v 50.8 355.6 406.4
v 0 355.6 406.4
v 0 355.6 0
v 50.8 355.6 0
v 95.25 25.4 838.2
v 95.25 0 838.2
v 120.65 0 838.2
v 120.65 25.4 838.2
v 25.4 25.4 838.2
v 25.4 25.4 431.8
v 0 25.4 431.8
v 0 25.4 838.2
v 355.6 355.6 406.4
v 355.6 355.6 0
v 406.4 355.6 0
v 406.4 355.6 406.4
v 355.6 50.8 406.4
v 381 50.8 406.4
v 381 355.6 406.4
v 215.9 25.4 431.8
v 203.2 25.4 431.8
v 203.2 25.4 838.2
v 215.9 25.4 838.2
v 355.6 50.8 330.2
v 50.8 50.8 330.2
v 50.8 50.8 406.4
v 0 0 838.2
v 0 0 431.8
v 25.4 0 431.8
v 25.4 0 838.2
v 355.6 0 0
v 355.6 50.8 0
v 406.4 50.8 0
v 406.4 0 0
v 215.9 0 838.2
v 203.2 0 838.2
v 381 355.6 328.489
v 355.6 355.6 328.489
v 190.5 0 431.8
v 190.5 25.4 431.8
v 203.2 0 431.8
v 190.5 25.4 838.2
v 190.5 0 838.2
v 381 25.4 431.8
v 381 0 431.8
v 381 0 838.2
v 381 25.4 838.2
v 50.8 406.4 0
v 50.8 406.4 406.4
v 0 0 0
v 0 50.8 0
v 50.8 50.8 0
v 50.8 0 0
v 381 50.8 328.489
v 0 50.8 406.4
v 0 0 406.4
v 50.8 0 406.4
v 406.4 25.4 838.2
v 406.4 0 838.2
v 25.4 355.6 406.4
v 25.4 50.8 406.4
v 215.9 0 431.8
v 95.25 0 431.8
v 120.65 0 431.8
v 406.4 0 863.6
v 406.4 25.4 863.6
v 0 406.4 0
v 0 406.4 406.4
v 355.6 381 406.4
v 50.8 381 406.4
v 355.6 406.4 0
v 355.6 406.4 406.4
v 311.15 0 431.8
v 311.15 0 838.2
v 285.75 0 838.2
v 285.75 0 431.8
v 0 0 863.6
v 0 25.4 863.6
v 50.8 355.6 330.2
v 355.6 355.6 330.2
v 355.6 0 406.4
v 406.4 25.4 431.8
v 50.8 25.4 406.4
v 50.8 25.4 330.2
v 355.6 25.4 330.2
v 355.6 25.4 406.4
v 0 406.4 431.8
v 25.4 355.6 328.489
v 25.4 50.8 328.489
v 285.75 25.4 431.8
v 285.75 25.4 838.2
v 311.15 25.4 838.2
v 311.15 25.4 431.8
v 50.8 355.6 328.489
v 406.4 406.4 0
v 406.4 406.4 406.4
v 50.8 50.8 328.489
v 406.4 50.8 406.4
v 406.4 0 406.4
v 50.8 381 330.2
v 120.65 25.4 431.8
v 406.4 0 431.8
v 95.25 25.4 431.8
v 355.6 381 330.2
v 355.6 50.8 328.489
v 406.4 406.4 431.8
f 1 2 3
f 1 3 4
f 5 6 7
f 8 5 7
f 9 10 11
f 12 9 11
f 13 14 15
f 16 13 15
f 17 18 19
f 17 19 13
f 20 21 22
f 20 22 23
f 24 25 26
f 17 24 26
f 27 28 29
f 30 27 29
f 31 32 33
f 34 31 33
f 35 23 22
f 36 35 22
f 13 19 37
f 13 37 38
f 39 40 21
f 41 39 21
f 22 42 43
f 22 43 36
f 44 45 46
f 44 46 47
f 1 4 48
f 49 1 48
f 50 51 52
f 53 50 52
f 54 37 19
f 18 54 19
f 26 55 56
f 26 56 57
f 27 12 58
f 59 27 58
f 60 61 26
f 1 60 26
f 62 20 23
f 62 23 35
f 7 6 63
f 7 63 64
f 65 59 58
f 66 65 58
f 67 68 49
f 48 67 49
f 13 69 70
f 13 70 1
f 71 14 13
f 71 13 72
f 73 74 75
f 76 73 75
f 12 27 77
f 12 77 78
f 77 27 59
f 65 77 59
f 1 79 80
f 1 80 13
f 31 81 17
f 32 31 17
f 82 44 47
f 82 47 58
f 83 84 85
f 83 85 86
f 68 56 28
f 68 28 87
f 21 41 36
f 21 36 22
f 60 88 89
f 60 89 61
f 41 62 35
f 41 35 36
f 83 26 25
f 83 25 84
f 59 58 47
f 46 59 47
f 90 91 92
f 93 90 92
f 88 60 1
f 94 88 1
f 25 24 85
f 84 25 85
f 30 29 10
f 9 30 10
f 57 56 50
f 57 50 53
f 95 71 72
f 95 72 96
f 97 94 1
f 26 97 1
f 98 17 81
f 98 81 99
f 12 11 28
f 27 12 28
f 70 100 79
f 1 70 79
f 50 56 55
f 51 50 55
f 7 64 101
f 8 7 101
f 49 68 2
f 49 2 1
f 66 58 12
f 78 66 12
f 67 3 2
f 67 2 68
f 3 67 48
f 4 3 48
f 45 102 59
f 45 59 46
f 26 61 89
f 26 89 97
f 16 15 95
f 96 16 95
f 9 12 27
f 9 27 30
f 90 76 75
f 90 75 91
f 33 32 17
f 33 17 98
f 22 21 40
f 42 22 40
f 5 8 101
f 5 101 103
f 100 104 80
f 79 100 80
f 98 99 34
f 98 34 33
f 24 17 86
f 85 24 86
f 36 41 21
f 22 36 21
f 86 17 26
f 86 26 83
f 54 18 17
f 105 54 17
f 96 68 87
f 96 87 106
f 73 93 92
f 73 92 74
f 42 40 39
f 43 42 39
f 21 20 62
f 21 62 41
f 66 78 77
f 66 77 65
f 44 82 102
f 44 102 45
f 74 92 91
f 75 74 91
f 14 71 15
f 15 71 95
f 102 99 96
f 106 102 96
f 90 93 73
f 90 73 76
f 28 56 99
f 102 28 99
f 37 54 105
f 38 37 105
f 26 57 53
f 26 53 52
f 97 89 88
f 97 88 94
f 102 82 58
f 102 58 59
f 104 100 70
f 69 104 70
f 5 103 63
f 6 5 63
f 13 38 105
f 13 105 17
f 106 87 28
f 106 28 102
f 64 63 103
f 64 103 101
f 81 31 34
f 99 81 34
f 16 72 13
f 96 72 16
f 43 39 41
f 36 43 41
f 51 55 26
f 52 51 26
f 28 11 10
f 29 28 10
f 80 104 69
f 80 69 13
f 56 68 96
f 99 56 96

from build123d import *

# Parameters (mm, degrees)
F0_W      = 50.8
F0_H      = 50.8
F1_DEPTH  = 406.4
F2_W      = 406.4
F2_H      = 406.4
F3_DEPTH  = 25.4
F5_DEPTH  = 406.4
F4_W      = 12.7
F4_H      = 12.7
F11_W     = 381
F11_H     = 25.4
F11_W_2   = 25.4
F12_DEPTH = 25.4
F13_W     = 25.4
F13_H     = 77.9108156204
F14_DEPTH = 304.8
F16_W     = 25.4
F16_H     = 76.2
F17_DEPTH = 304.8


with BuildPart() as f1:
    # F0 (on Top) → F1 (new body)
    with BuildSketch(Plane.XY):
        with Locations((25.4, 25.4)):
            Rectangle(F0_W, F0_H)
    extrude(amount=F1_DEPTH)


with BuildPart() as f1b:
    # F0 (on Top) → F1, piece 2 (new body)
    with BuildSketch(Plane.XY):
        with Locations((381, 25.4)):
            Rectangle(F0_W, F0_H)
    extrude(amount=F1_DEPTH)


with BuildPart() as f1c:
    # F0 (on Top) → F1, piece 3 (new body)
    with BuildSketch(Plane.XY):
        with Locations((381, 381)):
            Rectangle(F0_W, F0_H)
    extrude(amount=F1_DEPTH)


with BuildPart() as f1d:
    # F0 (on Top) → F1, piece 4 (new body)
    with BuildSketch(Plane.XY):
        with Locations((25.4, 381)):
            Rectangle(F0_W, F0_H)
    extrude(amount=F1_DEPTH)


with BuildPart() as f3:
    # F2 (on face) → F3 (new body)
    with BuildSketch(Plane.XY.offset(406.4)):
        with Locations((203.2, 203.2)):
            Rectangle(F2_W, F2_H)
    extrude(amount=F3_DEPTH)


with BuildPart() as f5:
    # F4 (on face) → F5 (new body)
    with BuildSketch(Plane.XY.offset(431.8)):
        Polygon((0, 25.4), (0, 0), (25.4, 0), (25.4, 12.7), (25.4, 25.4), align=None)
    extrude(amount=F5_DEPTH)


with BuildPart() as f5b:
    # F4 (on face) → F5, piece 2 (new body)
    with BuildSketch(Plane.XY.offset(431.8)):
        with Locations((114.3, 19.05)):
            Rectangle(F4_W, F4_H)
        Polygon((95.25, 12.7), (95.25, 0), (107.95, 0), (107.95, 12.7), (107.95, 25.4), (95.25, 25.4), align=None)
        with Locations((114.3, 6.35)):
            Rectangle(F4_W, F4_H)
    extrude(amount=F5_DEPTH)


with BuildPart() as f5c:
    # F4 (on face) → F5, piece 3 (new body)
    with BuildSketch(Plane.XY.offset(431.8)):
        Polygon((203.2, 0), (203.2, 25.4), (190.5, 25.4), (190.5, 12.7), (190.5, 0), align=None)
    extrude(amount=F5_DEPTH)


with BuildPart() as f10_1:
    # F10: instance of F5
    add(f5.part.mirror(Plane(origin=(203.2, 0, 431.8), x_dir=(0, 1, 0), z_dir=(1, 0, 0))))


with BuildPart() as f10_2:
    # F10: instance of F5b
    add(f5b.part.mirror(Plane(origin=(203.2, 0, 431.8), x_dir=(0, 1, 0), z_dir=(1, 0, 0))))


with BuildPart() as f10_3:
    # F10: instance of F5c
    add(f5c.part.mirror(Plane(origin=(203.2, 0, 431.8), x_dir=(0, 1, 0), z_dir=(1, 0, 0))))


with BuildPart() as f12:
    # F11 (on face) → F12 (new body)
    with BuildSketch(Plane.XY.offset(838.2)):
        with Locations((190.5, 12.7)):
            Rectangle(F11_W, F11_H)
        with Locations((393.7, 12.7)):
            Rectangle(F11_W_2, F11_H)
    extrude(amount=F12_DEPTH)


with BuildPart() as f14:
    # F13 (on face) → F14 (new body)
    with BuildSketch(Plane(origin=(0, 50.8, 0), x_dir=(-1, 0, 0), z_dir=(0, 1, 0))):
        with Locations((-368.3, 367.4445921898)):
            Rectangle(F13_W, F13_H)
    extrude(amount=F14_DEPTH)


with BuildPart() as f15_1:
    # F15: instance of F14
    add(f14.part.mirror(Plane(origin=(203.2, 0, 431.8), x_dir=(0, 1, 0), z_dir=(1, 0, 0))))


with BuildPart() as f17:
    # F16 (on face) → F17 (new body)
    with BuildSketch(Plane(origin=(355.6, 0, 0), x_dir=(0, -1, 0), z_dir=(-1, 0, 0))):
        with Locations((-368.3, 368.3)):
            Rectangle(F16_W, F16_H)
    extrude(amount=F17_DEPTH)


with BuildPart() as f17b:
    # F16 (on face) → F17, piece 2 (new body)
    with BuildSketch(Plane(origin=(355.6, 0, 0), x_dir=(0, -1, 0), z_dir=(-1, 0, 0))):
        with Locations((-38.1, 368.3)):
            Rectangle(F16_W, F16_H)
    extrude(amount=F17_DEPTH)


solid = Compound([f1.part, f1b.part, f1c.part, f1d.part, f3.part, f5.part, f5b.part, f5c.part, f10_1.part, f10_2.part, f10_3.part, f12.part, f14.part, f15_1.part, f17.part, f17b.part])
